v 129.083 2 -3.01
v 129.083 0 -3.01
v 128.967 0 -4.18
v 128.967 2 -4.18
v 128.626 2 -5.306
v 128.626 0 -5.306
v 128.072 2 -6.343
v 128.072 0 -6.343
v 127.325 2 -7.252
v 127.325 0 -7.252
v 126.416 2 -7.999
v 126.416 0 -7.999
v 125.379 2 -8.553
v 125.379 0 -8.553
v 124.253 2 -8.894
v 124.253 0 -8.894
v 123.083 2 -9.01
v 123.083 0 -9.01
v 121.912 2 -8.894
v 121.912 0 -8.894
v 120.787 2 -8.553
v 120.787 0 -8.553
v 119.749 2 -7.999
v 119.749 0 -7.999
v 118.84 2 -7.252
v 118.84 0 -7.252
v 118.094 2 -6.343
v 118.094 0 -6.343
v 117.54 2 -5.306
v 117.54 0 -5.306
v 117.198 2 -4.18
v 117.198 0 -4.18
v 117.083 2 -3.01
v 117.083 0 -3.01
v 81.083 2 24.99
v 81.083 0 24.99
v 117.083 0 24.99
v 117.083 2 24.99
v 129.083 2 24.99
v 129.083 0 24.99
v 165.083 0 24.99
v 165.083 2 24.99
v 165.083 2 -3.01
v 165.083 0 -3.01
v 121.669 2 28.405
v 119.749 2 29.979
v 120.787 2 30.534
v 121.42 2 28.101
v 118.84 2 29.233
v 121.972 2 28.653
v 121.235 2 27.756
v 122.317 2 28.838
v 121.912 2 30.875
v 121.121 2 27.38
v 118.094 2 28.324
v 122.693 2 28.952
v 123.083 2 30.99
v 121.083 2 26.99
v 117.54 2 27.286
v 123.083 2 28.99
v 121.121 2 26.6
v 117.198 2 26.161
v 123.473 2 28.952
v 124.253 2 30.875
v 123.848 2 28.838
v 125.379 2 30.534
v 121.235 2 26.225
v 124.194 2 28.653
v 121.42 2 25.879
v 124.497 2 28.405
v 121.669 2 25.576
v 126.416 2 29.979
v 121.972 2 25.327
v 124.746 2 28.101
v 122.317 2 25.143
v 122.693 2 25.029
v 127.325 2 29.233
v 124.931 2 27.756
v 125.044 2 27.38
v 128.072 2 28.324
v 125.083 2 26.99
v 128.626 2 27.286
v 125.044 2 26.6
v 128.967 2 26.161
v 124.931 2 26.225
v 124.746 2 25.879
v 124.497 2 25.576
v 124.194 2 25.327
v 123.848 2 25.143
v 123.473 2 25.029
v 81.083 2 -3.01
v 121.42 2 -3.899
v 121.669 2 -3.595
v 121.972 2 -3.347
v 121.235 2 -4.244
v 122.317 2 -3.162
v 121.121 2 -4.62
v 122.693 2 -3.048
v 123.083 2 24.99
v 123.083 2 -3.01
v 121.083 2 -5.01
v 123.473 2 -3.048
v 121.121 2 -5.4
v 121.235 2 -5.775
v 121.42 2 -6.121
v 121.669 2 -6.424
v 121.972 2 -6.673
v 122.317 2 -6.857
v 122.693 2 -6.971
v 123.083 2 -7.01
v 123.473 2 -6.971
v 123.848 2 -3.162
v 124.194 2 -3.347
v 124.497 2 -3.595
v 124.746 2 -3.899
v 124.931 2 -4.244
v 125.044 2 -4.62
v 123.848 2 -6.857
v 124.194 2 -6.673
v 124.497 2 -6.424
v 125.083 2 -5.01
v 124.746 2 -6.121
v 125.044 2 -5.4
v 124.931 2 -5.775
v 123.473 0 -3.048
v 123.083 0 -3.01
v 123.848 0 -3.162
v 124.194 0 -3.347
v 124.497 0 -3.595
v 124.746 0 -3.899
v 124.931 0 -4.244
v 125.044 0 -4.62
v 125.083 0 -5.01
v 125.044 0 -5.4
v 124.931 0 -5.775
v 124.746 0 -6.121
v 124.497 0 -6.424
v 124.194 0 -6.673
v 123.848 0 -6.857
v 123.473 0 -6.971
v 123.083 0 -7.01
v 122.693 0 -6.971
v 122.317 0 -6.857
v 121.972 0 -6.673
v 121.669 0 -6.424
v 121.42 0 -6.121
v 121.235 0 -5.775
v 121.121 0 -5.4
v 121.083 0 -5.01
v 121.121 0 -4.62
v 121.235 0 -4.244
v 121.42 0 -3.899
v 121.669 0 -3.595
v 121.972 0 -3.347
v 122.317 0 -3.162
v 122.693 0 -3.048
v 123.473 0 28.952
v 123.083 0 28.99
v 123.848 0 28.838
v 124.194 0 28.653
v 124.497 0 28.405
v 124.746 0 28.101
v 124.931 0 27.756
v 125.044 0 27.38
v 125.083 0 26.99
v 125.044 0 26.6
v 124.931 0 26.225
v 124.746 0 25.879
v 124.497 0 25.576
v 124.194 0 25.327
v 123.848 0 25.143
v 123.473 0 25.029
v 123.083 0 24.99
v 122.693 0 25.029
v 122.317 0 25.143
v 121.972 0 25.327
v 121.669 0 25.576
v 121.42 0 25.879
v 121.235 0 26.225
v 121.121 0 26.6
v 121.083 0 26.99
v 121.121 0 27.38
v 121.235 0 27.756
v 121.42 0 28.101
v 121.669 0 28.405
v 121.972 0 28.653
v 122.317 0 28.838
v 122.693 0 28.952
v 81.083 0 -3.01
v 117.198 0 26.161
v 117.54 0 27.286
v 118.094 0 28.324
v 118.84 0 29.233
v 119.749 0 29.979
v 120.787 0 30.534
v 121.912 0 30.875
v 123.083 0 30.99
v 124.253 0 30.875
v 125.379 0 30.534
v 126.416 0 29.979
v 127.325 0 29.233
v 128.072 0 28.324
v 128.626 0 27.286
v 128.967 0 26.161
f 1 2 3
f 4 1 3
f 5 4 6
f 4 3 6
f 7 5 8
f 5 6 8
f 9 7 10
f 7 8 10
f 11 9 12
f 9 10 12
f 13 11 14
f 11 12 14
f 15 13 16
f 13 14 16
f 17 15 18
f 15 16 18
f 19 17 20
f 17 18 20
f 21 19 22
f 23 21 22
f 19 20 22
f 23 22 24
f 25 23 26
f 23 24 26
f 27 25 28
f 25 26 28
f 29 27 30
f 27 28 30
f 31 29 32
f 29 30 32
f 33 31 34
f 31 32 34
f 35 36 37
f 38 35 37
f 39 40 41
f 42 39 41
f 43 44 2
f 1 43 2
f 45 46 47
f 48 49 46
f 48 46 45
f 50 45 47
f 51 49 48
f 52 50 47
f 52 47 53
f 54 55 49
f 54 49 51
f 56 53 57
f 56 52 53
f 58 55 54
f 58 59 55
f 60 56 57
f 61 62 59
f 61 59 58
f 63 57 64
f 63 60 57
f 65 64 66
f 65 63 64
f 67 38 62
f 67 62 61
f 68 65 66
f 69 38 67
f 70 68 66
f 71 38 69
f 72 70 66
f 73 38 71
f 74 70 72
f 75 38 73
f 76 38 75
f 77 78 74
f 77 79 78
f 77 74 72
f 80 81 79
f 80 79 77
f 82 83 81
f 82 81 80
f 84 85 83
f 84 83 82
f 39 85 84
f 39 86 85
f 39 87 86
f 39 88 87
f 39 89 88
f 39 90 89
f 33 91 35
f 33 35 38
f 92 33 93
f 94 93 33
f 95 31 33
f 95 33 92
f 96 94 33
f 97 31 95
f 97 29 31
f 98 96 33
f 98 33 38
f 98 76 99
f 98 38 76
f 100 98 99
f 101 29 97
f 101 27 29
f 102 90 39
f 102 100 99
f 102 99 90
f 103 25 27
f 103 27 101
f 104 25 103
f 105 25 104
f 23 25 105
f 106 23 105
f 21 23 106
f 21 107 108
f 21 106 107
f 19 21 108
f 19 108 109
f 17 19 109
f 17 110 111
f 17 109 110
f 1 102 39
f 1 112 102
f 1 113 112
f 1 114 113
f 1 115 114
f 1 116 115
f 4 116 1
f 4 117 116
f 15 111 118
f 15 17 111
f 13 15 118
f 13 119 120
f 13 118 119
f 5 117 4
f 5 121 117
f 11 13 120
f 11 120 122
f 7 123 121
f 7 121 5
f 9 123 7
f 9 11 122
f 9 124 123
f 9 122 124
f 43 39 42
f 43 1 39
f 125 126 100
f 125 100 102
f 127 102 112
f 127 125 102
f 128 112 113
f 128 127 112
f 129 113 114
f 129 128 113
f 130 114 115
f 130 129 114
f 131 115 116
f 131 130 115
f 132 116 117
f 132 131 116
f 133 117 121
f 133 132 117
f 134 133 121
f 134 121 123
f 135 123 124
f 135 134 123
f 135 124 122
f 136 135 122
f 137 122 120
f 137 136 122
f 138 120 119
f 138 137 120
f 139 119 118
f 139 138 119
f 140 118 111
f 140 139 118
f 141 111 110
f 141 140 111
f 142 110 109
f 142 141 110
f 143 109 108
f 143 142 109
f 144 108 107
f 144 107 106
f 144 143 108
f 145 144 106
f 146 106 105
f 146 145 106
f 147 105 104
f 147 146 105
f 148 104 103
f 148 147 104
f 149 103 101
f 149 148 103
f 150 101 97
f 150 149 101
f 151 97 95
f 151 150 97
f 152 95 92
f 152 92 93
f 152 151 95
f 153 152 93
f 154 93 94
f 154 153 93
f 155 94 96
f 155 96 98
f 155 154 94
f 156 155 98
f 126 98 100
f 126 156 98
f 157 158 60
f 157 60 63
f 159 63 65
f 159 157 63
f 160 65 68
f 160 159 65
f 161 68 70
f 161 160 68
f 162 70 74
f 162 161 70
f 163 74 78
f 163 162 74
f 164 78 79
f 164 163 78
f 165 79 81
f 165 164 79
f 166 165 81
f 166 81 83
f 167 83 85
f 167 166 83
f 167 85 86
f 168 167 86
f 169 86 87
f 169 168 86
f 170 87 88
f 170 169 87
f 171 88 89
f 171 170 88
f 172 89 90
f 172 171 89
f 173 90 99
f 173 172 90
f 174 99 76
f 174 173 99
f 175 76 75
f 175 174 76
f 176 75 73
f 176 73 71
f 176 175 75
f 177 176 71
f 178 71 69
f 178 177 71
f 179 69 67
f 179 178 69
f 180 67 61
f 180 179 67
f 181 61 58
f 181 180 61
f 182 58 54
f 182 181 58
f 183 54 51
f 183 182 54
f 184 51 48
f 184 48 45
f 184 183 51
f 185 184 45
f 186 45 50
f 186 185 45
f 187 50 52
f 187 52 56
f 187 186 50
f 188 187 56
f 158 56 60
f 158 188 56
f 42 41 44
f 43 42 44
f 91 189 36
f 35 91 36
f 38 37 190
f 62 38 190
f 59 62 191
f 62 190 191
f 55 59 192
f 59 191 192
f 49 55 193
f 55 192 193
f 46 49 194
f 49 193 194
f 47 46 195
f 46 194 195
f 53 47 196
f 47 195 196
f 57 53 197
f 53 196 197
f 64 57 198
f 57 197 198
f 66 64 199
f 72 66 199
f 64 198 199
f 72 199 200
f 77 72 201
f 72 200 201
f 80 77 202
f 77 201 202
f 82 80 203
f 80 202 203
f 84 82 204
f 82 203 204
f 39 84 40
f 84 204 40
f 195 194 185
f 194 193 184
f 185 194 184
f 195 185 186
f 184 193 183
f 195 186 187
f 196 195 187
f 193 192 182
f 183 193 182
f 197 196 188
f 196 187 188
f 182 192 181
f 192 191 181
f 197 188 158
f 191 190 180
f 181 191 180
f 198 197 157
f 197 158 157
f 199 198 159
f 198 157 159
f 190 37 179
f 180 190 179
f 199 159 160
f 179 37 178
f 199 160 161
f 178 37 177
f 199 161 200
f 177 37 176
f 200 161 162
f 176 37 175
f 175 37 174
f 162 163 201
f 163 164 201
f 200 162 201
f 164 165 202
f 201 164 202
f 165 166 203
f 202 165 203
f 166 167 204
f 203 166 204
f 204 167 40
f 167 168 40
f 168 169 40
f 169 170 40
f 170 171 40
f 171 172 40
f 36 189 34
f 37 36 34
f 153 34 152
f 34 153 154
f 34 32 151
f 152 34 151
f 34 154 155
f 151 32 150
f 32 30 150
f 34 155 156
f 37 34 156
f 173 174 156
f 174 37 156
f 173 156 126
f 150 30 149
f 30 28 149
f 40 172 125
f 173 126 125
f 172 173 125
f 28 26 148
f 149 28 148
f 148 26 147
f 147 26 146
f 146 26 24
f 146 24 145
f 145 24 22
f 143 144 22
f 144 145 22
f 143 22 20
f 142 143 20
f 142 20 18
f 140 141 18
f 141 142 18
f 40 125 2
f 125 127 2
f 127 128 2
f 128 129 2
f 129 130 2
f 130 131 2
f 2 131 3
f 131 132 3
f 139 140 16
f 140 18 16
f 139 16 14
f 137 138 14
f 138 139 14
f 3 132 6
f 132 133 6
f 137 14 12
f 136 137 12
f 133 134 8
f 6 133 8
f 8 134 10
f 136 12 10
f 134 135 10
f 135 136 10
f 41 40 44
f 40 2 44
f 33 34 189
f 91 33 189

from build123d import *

# Parameters (mm, degrees)
SKETCH1_R           = 2
BOSS_EXTRUDE1_DEPTH = 2


with BuildPart() as part:
    # Sketch1 → Boss-Extrude1 (new body)
    with BuildSketch(Plane(origin=(0, 0, 0), x_dir=(1, 0, 0), z_dir=(0, 1, 0))):
        with BuildLine():
            Line((165.082783055, -24.990305924), (165.082783055, 3.009694076))
            Line((165.082783055, 3.009694076), (129.082783055, 3.009694076))
            ThreePointArc((129.082783055, 3.009694076), (123.082783055, 9.009694076), (117.082783055, 3.009694076))
            Line((117.082783055, 3.009694076), (81.082783055, 3.009694076))
            Line((81.082783055, 3.009694076), (81.082783055, -24.990305924))
            Line((81.082783055, -24.990305924), (117.082783055, -24.990305924))
            ThreePointArc((117.082783055, -24.990305924), (123.082783055, -30.990305924), (129.082783055, -24.990305924))
            Line((129.082783055, -24.990305924), (165.082783055, -24.990305924))
        make_face()
        with Locations(Location((123.082783055, 5.009694076, 0), (0, 0, 270))):
            Circle(SKETCH1_R, mode=Mode.SUBTRACT)
        with Locations(Location((123.082783055, -26.990305924, 0), (0, 0, 270))):
            Circle(SKETCH1_R, mode=Mode.SUBTRACT)
    extrude(amount=BOSS_EXTRUDE1_DEPTH)


solid = part.part
